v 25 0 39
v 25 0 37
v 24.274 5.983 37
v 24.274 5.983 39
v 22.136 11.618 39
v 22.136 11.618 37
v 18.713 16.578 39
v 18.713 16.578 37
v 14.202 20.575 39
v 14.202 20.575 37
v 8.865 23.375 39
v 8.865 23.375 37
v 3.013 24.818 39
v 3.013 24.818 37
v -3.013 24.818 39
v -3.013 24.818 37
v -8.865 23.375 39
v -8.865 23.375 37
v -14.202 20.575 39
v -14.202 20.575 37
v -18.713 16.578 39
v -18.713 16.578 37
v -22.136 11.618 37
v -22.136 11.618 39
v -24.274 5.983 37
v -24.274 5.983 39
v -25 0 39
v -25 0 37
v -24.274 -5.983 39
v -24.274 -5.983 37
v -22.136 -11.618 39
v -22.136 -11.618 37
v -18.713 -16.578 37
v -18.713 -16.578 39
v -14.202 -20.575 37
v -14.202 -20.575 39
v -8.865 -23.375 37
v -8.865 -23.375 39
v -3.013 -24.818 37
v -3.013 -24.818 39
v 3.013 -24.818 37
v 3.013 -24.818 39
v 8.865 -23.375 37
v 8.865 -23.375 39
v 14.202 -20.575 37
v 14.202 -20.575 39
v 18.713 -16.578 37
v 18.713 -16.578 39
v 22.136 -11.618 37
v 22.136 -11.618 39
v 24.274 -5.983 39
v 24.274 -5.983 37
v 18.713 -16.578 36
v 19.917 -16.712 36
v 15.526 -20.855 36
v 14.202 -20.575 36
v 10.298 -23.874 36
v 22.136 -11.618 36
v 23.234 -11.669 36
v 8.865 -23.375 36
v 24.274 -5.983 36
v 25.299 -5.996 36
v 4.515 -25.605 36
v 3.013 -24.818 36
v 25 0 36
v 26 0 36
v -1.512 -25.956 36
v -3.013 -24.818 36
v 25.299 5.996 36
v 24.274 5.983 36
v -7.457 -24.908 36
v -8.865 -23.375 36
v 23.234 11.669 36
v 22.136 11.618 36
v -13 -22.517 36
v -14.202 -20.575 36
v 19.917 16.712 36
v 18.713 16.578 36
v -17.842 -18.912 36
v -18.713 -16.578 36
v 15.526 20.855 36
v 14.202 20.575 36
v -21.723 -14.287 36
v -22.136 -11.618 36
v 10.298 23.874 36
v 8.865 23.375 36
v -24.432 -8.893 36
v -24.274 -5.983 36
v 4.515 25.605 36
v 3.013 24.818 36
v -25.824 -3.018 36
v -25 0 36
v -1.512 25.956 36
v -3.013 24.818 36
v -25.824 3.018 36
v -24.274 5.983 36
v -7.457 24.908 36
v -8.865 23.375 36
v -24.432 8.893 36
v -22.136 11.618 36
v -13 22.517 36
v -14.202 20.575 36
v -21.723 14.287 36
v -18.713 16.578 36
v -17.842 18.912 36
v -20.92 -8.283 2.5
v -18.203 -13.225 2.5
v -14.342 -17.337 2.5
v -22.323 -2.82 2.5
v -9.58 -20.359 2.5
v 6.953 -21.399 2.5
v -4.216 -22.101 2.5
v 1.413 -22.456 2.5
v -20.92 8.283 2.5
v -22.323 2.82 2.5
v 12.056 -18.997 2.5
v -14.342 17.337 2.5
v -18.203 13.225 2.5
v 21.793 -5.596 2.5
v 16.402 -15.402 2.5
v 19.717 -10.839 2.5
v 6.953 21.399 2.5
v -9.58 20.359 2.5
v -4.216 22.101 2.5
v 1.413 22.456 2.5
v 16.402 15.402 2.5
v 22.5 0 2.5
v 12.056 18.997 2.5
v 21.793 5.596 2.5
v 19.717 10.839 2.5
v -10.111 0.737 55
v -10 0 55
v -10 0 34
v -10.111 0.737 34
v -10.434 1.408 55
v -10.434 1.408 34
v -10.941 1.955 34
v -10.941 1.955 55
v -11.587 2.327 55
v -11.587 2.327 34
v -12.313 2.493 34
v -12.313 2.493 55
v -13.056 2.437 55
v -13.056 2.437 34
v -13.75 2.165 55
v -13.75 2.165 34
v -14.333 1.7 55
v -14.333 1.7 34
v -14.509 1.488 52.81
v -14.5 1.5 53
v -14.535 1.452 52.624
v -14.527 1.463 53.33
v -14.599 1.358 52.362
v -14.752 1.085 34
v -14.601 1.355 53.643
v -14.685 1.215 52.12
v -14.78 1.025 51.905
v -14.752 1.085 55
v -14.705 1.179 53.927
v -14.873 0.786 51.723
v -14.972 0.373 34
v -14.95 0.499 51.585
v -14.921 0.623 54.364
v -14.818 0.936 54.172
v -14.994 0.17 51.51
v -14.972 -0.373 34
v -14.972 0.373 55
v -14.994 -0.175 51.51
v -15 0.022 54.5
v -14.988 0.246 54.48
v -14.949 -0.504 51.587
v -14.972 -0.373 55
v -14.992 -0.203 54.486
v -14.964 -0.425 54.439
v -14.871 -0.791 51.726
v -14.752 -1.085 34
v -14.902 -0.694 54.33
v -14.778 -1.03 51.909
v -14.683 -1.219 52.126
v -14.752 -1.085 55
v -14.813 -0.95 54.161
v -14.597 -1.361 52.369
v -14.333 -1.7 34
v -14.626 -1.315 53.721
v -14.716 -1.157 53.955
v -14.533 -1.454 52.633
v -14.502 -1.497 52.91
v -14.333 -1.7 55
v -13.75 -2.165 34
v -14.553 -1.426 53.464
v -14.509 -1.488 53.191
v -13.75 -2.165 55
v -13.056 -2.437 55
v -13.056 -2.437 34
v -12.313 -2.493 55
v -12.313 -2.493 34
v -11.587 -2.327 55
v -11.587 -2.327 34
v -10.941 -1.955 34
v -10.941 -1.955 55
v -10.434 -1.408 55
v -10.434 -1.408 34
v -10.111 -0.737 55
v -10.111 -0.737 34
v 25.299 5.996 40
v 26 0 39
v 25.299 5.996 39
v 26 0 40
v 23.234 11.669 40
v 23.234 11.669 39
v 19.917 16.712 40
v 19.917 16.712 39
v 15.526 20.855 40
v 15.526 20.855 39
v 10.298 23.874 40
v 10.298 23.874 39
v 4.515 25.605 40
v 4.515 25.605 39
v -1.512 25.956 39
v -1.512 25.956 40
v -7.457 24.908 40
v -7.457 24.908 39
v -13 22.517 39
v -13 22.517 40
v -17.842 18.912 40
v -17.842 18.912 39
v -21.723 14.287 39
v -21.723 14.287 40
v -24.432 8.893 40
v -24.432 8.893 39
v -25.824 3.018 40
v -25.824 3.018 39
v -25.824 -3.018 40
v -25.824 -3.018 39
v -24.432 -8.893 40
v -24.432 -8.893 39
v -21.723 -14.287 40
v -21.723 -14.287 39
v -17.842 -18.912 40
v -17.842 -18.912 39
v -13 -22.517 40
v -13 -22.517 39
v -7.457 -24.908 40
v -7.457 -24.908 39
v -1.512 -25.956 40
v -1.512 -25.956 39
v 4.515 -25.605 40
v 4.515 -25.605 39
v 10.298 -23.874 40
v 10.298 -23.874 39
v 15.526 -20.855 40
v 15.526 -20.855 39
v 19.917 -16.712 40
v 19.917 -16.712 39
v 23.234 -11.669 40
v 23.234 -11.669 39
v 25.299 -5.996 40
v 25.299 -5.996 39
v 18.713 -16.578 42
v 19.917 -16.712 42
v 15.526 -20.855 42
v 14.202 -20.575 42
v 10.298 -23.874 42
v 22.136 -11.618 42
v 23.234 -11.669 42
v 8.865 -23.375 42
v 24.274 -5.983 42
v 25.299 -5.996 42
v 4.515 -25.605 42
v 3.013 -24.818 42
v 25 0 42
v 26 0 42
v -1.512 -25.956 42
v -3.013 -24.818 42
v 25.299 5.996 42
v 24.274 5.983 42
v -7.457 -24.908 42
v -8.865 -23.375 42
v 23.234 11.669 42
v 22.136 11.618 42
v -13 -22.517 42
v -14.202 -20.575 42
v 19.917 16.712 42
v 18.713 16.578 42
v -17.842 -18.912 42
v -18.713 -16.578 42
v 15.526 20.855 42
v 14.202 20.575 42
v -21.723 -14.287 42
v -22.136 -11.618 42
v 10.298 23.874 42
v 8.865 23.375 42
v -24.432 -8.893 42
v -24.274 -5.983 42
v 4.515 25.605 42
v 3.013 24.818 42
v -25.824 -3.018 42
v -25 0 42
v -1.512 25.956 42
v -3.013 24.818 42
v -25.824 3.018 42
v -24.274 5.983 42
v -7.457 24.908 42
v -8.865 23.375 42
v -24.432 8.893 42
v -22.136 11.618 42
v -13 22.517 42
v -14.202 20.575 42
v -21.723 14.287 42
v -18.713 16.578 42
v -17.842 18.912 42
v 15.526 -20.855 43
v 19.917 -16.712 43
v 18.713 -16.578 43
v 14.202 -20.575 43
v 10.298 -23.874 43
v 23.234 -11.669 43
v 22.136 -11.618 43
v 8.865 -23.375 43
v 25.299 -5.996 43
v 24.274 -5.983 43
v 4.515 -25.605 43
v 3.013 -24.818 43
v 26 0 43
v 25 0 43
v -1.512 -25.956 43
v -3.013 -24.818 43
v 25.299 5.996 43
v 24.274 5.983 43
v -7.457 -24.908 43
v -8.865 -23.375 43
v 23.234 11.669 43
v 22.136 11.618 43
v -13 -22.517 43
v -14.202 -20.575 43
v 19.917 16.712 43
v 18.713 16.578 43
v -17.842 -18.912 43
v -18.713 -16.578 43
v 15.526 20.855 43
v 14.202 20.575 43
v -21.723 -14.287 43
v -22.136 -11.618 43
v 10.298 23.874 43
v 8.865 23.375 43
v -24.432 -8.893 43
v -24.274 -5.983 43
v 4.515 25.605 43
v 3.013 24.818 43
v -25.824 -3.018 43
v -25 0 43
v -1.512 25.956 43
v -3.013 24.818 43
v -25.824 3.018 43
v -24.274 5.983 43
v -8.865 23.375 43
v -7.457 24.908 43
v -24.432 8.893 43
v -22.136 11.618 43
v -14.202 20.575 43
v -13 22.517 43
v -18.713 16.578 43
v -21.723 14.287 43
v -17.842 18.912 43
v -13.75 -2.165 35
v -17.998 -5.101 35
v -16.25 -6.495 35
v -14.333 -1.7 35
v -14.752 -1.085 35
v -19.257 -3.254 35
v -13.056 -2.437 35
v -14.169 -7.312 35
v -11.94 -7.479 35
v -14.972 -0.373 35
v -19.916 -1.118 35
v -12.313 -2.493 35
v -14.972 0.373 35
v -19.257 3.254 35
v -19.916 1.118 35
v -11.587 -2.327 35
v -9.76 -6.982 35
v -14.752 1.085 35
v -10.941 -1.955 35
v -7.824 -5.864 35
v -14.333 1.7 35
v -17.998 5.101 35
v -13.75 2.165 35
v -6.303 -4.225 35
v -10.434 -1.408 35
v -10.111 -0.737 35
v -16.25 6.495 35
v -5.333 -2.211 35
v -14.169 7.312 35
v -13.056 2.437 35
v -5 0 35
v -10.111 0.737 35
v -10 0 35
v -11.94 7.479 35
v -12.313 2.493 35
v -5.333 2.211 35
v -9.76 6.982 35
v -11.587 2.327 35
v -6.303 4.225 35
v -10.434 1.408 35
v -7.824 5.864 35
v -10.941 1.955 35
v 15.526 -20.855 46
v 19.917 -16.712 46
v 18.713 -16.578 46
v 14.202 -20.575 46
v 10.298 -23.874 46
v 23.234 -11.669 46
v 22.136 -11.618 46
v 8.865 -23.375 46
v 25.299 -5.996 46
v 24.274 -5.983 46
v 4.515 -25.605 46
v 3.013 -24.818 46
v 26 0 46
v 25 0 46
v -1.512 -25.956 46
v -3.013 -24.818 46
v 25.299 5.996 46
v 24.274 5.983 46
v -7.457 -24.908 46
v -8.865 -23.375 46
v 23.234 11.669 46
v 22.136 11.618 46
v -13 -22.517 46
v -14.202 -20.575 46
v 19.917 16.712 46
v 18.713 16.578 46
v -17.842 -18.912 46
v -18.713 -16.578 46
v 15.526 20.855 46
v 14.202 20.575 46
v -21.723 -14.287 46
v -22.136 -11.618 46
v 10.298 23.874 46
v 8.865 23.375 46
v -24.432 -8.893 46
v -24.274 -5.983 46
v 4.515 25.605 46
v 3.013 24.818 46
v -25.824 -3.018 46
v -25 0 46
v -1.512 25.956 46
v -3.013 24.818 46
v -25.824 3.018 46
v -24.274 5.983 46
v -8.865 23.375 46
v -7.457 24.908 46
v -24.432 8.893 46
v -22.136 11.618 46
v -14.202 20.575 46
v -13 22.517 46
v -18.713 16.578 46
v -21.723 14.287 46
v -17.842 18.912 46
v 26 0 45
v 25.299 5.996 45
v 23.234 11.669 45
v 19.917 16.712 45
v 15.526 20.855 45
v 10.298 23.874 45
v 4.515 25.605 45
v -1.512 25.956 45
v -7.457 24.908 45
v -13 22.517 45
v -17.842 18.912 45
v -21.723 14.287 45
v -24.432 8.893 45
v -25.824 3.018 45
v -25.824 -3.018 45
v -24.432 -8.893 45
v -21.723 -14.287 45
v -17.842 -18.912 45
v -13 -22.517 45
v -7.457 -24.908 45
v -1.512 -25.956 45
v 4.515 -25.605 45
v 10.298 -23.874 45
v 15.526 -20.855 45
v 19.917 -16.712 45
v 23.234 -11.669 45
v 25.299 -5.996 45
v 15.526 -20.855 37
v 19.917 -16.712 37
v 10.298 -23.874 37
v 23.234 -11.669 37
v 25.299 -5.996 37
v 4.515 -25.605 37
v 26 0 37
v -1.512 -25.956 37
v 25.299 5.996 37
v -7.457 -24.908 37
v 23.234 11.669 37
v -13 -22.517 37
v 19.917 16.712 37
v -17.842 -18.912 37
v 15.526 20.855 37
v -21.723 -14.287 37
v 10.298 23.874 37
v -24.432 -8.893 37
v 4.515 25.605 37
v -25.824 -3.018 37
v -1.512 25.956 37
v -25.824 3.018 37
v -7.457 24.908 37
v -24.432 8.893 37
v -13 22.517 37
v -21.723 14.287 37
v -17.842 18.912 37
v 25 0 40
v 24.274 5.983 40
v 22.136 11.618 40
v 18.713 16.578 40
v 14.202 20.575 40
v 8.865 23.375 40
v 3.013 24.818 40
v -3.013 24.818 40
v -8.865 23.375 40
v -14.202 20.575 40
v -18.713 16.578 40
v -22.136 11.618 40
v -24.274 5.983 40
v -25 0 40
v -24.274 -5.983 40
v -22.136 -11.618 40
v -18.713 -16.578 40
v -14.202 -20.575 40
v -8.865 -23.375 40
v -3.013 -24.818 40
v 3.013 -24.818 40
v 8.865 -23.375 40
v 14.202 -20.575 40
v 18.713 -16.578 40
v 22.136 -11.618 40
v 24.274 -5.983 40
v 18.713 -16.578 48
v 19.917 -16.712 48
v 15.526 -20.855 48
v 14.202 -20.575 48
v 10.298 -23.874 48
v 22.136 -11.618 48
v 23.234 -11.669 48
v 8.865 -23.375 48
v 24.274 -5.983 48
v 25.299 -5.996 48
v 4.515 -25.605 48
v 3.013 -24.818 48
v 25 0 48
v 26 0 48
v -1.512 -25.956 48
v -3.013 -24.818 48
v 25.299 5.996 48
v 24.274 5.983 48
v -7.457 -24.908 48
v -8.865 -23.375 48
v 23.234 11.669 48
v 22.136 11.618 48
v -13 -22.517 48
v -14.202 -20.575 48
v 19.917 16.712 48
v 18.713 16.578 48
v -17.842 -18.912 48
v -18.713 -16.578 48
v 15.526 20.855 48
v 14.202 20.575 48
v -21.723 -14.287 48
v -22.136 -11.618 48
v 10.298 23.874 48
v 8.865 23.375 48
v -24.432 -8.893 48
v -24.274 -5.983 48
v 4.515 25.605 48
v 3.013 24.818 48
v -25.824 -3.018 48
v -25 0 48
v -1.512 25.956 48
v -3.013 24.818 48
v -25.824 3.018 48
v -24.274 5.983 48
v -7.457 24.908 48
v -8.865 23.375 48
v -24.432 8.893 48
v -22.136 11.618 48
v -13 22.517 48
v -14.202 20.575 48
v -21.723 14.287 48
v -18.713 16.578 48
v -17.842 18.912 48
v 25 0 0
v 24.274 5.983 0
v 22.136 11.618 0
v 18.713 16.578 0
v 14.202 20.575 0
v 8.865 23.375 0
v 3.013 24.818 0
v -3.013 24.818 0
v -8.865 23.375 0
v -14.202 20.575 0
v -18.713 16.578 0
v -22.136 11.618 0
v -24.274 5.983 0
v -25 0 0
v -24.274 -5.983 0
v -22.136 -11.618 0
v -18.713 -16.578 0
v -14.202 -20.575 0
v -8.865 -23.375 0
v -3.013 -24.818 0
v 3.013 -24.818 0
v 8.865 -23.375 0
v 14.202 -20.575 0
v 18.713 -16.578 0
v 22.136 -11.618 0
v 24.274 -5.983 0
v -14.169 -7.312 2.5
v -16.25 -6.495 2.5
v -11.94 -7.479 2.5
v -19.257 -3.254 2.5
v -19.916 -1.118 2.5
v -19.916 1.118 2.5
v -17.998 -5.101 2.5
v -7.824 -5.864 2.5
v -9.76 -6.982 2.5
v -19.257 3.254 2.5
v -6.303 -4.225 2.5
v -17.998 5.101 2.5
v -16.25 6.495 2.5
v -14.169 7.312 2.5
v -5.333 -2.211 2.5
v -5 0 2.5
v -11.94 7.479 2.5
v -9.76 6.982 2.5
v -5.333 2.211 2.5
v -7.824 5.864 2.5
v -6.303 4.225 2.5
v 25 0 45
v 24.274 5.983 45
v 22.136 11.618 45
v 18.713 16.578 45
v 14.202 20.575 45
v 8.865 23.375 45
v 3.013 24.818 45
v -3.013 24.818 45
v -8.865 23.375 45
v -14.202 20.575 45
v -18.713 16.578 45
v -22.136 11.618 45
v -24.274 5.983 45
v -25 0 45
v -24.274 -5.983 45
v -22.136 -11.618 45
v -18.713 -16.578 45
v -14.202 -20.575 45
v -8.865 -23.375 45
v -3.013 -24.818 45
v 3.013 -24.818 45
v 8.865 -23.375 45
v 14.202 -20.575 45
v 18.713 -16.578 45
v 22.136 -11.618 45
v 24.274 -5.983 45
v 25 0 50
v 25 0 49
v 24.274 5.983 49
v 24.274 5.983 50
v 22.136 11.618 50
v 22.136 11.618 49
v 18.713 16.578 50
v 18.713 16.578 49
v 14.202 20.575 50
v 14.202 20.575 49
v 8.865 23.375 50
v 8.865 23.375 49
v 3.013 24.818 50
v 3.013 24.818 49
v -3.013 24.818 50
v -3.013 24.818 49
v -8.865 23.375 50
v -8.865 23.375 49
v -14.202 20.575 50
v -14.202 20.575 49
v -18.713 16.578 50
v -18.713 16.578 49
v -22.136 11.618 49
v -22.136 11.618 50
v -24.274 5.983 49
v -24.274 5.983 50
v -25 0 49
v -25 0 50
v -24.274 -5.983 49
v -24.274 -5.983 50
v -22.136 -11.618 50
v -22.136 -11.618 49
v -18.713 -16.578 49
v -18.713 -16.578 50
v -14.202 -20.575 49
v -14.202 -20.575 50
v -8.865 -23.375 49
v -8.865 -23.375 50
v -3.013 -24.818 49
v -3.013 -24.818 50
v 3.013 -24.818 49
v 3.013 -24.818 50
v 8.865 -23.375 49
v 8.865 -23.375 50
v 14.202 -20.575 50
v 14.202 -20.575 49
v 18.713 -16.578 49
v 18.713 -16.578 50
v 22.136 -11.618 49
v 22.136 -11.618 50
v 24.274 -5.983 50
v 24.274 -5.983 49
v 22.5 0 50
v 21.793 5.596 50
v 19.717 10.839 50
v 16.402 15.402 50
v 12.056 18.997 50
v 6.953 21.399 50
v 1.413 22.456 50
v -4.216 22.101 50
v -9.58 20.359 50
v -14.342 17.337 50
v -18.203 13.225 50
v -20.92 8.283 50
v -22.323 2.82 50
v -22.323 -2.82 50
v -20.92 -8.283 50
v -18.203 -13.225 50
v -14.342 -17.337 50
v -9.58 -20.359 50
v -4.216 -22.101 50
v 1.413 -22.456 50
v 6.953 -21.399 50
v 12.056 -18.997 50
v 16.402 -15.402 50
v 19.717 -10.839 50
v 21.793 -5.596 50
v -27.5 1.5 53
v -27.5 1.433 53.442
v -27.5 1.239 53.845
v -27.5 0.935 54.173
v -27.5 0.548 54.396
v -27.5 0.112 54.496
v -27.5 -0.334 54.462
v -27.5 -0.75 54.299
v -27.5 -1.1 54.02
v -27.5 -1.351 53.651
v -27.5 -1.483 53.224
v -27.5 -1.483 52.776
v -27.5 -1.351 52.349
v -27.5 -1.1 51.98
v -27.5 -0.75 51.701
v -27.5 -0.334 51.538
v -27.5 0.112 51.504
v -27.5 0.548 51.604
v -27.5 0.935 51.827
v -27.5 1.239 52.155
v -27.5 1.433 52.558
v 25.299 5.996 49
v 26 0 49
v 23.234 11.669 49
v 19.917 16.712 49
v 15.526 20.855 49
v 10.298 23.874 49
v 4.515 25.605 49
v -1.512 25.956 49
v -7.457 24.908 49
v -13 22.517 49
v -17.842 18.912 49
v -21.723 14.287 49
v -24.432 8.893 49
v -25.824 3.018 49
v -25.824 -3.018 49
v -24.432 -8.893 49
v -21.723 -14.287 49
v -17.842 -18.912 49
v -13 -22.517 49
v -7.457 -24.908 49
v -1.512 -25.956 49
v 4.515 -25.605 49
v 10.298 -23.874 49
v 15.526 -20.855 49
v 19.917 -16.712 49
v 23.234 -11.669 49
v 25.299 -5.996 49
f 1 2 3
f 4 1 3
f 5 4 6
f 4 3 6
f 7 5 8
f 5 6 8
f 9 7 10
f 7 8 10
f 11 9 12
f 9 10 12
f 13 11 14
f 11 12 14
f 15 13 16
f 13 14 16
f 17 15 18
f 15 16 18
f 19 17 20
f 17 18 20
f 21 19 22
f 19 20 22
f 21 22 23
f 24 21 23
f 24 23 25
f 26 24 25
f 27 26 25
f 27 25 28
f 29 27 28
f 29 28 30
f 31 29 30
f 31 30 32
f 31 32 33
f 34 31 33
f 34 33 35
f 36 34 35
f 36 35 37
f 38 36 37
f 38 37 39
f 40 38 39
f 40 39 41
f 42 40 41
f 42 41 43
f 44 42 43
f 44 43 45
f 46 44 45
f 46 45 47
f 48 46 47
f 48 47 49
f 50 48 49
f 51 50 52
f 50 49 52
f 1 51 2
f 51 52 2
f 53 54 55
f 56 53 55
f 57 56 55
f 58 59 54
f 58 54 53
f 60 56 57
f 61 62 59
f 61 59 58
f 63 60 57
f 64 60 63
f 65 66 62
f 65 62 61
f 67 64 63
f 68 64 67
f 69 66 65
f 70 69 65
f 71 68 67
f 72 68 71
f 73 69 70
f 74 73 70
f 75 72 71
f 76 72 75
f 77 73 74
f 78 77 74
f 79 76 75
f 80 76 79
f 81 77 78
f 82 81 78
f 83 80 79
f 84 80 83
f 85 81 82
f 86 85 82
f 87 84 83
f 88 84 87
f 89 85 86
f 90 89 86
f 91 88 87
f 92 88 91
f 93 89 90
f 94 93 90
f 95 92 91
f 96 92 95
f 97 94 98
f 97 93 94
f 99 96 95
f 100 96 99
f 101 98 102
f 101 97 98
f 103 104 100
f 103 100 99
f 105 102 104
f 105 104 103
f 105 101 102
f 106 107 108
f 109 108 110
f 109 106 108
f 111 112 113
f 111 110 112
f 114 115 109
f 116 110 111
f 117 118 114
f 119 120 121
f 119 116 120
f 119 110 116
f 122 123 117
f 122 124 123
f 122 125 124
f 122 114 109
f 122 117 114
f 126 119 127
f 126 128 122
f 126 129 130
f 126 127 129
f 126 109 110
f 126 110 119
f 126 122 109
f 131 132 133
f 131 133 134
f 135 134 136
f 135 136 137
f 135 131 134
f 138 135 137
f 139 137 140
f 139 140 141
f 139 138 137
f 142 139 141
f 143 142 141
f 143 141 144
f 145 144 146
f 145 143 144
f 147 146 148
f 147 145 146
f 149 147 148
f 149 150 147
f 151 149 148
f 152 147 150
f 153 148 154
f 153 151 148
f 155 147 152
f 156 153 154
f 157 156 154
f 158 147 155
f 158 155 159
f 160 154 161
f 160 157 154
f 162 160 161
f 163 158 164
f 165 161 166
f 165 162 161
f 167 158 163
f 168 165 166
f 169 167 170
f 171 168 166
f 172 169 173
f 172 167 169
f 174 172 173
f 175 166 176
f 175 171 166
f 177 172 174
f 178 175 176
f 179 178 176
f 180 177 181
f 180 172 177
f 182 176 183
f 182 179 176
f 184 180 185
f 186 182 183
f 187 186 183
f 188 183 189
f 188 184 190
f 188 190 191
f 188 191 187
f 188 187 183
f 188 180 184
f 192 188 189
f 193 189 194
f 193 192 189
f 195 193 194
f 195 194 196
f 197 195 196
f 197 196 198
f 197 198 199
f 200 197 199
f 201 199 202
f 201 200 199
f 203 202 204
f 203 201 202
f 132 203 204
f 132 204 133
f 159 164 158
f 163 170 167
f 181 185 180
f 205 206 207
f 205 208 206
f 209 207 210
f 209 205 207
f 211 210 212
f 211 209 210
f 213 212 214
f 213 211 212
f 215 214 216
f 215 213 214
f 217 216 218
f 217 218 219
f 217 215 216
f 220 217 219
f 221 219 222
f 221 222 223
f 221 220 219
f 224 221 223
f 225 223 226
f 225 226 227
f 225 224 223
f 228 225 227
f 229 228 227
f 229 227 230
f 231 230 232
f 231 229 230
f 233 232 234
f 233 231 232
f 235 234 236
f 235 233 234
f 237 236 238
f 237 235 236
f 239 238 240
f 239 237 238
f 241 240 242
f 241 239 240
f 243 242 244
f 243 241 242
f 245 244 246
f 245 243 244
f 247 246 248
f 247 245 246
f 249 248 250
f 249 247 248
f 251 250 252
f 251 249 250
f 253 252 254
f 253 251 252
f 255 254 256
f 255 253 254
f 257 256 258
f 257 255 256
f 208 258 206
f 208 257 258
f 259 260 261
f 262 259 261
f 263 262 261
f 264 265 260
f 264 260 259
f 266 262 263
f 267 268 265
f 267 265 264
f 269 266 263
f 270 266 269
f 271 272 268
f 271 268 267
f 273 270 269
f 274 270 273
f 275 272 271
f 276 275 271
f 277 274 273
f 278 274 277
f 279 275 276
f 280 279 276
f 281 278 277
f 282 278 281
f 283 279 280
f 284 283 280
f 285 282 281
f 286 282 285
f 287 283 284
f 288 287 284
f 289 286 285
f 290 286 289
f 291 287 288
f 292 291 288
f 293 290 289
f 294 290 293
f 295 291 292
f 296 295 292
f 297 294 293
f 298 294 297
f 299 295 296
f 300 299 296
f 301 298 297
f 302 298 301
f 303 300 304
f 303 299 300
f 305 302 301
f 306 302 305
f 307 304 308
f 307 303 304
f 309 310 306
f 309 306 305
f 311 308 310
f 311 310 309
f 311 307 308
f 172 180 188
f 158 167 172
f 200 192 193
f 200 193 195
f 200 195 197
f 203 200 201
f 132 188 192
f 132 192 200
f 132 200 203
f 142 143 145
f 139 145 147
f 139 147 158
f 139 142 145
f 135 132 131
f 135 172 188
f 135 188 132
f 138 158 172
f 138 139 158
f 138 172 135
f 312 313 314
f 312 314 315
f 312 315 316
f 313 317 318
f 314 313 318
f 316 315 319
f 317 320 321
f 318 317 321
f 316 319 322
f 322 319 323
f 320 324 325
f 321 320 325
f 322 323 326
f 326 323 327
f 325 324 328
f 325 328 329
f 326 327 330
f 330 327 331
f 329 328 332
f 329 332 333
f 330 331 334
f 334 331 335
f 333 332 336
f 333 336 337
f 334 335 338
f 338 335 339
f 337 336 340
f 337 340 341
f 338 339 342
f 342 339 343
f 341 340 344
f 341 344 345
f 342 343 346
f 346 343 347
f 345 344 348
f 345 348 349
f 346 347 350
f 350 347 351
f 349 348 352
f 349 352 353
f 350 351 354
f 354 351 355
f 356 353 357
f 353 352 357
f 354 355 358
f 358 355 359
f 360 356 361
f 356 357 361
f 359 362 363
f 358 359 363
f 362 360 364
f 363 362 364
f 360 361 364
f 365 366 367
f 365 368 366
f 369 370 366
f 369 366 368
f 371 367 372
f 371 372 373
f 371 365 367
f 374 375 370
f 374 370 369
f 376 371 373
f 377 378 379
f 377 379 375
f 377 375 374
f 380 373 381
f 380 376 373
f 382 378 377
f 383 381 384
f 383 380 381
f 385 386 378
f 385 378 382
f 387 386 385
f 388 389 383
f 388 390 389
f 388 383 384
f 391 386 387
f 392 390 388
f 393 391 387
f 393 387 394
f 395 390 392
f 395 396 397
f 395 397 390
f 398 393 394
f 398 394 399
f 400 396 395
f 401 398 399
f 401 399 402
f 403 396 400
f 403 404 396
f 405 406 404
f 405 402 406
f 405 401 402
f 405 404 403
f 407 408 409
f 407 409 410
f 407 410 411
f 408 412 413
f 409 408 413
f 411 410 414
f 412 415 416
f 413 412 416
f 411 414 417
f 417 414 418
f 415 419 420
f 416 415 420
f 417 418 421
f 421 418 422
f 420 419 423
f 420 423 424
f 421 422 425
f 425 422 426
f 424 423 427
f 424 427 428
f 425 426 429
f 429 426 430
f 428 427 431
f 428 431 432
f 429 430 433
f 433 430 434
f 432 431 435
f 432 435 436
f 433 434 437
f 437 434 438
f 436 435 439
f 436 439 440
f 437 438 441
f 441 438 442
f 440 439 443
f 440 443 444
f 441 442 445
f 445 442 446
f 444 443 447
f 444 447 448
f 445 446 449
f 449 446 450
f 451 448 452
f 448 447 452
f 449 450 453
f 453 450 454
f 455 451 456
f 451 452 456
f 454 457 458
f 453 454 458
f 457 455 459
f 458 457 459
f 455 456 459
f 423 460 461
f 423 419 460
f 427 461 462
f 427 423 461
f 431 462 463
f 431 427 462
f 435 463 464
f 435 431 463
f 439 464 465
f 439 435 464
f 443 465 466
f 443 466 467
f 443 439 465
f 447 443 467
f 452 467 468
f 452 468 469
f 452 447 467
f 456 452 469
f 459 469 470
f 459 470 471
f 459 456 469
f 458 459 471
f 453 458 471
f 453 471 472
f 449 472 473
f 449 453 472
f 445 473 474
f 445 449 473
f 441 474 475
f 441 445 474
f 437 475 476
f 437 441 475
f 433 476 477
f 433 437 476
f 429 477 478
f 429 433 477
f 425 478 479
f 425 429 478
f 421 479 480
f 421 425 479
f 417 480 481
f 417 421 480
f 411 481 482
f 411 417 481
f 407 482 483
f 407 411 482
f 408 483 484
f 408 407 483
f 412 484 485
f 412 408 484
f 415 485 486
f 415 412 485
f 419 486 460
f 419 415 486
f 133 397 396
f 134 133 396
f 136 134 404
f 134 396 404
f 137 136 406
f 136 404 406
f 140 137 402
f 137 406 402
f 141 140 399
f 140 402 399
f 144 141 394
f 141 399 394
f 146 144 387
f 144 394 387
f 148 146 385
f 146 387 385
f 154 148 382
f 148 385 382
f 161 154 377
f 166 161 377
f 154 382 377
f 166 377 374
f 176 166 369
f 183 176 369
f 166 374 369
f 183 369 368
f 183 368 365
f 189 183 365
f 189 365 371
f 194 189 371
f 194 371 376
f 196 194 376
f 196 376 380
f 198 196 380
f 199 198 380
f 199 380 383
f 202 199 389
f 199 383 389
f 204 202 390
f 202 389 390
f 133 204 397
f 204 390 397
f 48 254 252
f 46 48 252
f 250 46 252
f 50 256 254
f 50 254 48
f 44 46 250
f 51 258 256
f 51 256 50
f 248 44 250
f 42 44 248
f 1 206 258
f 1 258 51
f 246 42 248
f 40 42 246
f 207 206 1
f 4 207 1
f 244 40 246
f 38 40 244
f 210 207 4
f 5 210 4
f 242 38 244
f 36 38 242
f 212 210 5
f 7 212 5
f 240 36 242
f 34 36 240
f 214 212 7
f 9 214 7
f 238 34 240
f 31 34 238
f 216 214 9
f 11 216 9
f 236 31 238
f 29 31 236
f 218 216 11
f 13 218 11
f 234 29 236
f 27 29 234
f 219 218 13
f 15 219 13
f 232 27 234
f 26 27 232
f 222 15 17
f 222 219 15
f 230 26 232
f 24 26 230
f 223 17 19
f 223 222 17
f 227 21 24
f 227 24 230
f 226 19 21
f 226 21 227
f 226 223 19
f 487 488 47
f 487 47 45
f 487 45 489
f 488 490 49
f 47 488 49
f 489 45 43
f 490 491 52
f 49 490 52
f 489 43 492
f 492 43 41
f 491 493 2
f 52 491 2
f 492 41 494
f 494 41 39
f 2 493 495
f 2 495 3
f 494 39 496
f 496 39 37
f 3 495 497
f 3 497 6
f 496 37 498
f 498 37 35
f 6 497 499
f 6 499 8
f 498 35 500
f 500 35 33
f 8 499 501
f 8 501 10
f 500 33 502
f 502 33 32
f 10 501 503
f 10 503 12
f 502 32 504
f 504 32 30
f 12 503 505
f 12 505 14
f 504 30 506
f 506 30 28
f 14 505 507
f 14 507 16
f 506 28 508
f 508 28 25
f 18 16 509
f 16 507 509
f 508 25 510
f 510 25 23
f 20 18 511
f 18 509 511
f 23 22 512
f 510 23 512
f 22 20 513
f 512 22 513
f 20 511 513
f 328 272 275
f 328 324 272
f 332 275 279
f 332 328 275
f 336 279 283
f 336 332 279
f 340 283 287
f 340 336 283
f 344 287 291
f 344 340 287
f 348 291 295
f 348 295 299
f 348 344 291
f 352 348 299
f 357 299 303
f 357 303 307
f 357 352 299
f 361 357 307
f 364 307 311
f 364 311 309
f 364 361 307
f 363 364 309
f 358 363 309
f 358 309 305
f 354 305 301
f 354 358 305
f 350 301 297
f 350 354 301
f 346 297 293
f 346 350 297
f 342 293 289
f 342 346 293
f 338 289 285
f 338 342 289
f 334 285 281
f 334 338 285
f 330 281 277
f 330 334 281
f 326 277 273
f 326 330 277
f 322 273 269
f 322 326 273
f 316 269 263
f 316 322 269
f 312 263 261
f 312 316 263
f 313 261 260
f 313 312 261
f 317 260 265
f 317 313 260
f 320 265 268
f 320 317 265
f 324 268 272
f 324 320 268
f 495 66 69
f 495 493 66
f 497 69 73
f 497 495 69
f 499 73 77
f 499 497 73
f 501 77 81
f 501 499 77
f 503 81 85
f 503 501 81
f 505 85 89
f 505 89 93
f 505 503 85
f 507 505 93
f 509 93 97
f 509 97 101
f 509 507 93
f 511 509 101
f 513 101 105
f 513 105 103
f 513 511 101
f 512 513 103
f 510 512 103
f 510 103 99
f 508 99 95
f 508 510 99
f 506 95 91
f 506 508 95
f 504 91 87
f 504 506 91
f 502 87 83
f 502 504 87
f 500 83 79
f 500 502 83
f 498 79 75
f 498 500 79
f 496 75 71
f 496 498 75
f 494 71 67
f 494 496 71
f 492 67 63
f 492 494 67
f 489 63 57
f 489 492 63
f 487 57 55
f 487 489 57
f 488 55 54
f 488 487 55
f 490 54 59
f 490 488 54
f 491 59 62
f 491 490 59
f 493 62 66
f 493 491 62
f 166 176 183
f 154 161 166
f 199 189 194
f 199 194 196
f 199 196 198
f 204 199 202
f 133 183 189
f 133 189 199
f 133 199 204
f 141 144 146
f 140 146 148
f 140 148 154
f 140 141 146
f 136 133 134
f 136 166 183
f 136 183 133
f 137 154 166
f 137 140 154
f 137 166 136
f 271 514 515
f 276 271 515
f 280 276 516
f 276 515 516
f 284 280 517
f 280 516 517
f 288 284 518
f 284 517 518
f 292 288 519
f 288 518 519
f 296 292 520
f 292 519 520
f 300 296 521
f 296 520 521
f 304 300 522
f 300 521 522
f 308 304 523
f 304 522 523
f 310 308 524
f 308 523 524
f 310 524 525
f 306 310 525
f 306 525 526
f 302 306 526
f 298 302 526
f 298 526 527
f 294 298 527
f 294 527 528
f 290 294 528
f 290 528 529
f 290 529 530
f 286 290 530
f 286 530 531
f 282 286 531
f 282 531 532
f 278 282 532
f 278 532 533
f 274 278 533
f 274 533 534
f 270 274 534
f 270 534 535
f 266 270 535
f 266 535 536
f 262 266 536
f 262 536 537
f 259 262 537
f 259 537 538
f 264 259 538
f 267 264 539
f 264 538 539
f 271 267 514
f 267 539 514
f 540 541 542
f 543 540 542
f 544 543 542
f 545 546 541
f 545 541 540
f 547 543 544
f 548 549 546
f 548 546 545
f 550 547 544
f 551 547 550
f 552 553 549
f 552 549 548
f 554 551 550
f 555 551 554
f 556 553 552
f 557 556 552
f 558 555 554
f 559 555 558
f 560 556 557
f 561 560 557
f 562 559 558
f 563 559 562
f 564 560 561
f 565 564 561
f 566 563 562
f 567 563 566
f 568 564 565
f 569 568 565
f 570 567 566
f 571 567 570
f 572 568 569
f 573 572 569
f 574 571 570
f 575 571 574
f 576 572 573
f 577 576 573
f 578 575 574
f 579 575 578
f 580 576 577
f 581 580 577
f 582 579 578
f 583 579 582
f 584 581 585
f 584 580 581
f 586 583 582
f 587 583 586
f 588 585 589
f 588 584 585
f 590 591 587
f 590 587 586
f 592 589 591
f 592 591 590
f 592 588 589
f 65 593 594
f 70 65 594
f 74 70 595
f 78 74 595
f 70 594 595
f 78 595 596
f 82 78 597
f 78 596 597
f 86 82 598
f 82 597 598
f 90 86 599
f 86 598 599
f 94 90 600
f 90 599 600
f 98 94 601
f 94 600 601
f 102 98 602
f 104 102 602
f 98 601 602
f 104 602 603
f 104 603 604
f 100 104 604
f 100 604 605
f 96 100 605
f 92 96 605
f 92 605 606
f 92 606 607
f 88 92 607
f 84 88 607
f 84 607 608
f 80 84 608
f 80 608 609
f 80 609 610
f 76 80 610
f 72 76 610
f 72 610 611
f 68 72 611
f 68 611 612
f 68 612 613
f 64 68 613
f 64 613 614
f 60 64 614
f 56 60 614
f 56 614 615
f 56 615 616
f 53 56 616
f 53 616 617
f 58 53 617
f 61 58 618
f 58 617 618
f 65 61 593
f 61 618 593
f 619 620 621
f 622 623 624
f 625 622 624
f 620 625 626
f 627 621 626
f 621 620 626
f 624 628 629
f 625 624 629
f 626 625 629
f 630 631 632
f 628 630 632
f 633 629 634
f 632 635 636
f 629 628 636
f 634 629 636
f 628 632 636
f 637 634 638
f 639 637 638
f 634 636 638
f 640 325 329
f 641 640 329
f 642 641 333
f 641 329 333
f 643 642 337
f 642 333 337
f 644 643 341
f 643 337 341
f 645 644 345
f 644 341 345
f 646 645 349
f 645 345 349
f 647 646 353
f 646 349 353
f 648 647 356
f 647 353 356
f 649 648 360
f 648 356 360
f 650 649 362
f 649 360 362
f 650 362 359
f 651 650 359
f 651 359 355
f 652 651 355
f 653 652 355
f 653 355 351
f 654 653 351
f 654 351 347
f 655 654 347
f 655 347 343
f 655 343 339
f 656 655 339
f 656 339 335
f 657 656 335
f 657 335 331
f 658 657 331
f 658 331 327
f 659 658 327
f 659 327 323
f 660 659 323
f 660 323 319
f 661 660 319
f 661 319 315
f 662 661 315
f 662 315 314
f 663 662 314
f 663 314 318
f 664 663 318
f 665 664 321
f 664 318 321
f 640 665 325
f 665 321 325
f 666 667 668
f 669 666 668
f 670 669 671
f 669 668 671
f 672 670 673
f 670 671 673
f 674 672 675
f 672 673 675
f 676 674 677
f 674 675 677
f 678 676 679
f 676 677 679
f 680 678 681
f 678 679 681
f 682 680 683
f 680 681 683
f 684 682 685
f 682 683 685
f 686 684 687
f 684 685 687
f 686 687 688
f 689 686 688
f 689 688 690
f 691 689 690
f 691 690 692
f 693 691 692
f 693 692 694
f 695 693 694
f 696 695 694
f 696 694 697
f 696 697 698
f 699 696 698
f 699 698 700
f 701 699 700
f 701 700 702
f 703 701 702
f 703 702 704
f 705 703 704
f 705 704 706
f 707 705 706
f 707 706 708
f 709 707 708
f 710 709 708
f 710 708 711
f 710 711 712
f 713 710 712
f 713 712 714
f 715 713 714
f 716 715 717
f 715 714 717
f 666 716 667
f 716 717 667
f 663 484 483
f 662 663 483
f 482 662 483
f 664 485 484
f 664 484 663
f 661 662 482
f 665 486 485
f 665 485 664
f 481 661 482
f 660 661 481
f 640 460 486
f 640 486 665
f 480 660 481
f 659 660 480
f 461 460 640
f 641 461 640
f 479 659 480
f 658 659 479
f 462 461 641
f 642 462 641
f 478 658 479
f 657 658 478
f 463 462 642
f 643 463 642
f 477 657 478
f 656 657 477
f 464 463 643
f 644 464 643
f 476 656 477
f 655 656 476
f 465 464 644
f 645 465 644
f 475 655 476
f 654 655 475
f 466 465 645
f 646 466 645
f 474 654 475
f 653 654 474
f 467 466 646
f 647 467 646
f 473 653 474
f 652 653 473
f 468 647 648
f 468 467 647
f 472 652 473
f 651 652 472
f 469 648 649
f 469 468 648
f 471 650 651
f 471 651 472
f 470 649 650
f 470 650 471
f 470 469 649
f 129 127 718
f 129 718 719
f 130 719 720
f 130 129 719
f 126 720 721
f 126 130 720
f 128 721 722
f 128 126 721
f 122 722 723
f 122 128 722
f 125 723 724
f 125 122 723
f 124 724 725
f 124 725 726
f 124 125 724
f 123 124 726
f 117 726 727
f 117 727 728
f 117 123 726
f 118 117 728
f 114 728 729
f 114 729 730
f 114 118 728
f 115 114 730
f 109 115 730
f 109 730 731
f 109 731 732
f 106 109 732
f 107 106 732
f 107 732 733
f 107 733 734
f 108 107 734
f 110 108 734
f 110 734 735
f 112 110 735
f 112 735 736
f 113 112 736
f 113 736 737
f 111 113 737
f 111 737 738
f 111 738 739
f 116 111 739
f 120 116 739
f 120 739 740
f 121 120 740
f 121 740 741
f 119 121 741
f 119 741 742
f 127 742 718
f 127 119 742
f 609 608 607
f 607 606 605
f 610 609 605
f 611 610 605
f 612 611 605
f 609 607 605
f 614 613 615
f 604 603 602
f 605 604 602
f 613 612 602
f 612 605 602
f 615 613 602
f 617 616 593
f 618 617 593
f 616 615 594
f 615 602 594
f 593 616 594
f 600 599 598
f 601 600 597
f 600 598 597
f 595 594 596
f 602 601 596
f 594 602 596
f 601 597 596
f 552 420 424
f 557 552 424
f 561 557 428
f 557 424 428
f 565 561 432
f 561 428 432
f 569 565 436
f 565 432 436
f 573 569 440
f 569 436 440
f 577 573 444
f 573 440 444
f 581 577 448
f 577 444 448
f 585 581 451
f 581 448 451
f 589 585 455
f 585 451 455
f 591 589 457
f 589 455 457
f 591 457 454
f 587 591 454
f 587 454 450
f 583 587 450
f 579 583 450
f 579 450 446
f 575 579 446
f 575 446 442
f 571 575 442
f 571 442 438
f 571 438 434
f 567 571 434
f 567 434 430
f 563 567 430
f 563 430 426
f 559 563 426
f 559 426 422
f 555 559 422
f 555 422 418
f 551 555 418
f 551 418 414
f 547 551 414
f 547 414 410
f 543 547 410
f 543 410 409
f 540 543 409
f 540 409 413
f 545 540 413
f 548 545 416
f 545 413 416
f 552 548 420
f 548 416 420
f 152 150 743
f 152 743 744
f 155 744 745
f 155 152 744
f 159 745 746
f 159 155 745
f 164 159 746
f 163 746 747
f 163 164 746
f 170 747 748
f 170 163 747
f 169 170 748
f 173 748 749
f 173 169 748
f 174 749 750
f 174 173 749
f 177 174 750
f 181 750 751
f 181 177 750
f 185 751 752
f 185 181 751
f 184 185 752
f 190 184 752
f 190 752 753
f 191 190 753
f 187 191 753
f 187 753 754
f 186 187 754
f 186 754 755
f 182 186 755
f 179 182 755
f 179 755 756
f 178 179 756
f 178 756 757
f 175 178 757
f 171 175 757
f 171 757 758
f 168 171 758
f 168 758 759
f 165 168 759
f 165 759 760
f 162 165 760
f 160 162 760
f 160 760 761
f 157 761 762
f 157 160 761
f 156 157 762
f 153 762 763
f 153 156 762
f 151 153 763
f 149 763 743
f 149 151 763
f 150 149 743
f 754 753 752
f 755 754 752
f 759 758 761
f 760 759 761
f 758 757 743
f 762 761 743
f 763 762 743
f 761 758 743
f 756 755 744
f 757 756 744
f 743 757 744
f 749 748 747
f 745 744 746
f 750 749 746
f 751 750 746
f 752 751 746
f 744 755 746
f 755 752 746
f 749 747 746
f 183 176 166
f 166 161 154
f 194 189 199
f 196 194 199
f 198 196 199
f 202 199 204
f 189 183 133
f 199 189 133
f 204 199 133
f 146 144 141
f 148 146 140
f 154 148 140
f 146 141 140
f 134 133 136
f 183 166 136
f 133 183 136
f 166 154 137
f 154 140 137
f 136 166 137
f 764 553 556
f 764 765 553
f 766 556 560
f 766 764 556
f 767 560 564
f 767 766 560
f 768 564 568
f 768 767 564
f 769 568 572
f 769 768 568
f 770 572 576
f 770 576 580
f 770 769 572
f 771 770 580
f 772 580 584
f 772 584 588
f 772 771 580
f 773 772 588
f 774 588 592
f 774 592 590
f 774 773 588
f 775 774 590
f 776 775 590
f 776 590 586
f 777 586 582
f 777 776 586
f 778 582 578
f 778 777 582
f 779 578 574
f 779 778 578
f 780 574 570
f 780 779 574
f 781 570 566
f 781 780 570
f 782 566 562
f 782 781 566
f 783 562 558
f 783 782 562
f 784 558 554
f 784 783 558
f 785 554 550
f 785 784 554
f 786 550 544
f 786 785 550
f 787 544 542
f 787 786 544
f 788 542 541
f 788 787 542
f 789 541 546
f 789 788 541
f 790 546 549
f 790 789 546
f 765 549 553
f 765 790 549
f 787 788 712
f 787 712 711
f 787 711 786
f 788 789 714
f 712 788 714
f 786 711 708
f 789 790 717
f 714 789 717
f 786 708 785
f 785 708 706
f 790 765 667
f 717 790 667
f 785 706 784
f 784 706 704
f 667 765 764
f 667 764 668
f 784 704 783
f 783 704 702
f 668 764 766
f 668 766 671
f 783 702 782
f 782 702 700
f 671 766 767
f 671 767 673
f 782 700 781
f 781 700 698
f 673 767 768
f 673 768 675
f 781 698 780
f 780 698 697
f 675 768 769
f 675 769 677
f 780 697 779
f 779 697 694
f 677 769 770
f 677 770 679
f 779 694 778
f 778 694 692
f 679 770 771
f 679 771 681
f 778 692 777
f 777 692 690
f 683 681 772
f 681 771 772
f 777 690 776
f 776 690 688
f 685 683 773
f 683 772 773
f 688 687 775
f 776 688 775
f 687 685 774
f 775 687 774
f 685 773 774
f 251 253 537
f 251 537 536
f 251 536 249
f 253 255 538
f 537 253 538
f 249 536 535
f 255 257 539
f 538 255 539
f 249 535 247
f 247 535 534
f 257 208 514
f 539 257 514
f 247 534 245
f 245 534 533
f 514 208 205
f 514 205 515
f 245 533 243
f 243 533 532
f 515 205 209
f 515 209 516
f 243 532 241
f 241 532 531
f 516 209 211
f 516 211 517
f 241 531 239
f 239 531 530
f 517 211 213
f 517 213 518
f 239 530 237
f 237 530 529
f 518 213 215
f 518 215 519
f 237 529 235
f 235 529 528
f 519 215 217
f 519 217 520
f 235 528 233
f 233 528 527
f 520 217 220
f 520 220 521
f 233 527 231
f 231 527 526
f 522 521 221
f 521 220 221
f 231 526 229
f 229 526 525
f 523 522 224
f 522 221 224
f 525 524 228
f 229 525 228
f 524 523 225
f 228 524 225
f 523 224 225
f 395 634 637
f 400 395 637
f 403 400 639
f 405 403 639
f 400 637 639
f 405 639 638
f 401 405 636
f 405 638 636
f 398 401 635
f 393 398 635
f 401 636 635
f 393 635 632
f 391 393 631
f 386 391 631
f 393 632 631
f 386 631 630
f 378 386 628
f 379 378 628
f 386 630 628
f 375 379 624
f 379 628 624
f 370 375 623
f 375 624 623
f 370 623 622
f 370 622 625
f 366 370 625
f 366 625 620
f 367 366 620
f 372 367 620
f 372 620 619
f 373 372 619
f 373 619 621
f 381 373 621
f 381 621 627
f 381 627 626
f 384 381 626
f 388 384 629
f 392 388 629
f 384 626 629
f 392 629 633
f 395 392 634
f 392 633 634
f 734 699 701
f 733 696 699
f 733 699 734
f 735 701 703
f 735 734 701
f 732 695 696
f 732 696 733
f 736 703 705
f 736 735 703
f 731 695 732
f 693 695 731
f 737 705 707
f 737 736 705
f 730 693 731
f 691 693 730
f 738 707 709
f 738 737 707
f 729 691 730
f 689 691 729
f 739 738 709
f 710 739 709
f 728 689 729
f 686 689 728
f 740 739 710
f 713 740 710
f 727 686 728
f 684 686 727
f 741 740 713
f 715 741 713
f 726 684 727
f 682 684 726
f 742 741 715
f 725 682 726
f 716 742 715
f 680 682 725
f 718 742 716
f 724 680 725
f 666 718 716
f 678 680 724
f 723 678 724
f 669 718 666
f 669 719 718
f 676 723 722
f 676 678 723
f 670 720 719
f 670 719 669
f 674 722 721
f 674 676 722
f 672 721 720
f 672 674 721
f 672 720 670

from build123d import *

# Parameters (mm, degrees)
F0_R          = 25
F1_DEPTH      = 50
F2_T          = -2.5
F3_W          = 1
F3_H          = 1
F6_START      = 2.5
F5_R          = 7.5
F6_DEPTH      = 32.5
F7_R          = 2.5
F8_DEPTH      = 20
F8_DEPTH_BACK = 1
F11_R         = 1.5
F12_DEPTH     = 15


with BuildPart() as f1:
    # F0 (on Top) → F1 (new body)
    with BuildSketch(Plane.XY):
        Circle(F0_R)
    extrude(amount=F1_DEPTH)

    # F2
    f2_openings = [f1.faces().sort_by_distance(p)[0] for p in [
        (0, 0, 50),
    ]]
    offset(amount=F2_T, openings=f2_openings)

    # F3 (on Front) → F4 (revolve)
    with BuildSketch(Plane.XZ):
        with Locations((25.5, 48.5)):
            Rectangle(F3_W, F3_H)
        with Locations((25.5, 36.5)):
            Rectangle(F3_W, F3_H)
        with Locations((25.5, 39.5)):
            Rectangle(F3_W, F3_H)
        with Locations((25.5, 42.5)):
            Rectangle(F3_W, F3_H)
        with Locations((25.5, 45.5)):
            Rectangle(F3_W, F3_H)
    revolve(axis=Axis((0, 0, 25), (0, 0, 1)))


with BuildPart() as f6:
    # F5 (on Top) → F6 (new body)
    with BuildSketch(Plane.XY.offset(F6_START)):
        with Locations((-12.5, 0)):
            Circle(F5_R)
    extrude(amount=F6_DEPTH)


with BuildPart() as f8:
    # F7 (on face) → F8 (new body, two sides)
    with BuildSketch(Plane.XY.offset(35)) as f8_sk:
        with Locations((-12.5, 0)):
            Circle(F7_R)
    extrude(amount=F8_DEPTH)
    extrude(f8_sk.sketch, amount=-F8_DEPTH_BACK)


with BuildPart() as f6_1:
    add(f6.part)

    # F9: cut F8
    add(f8.part, mode=Mode.SUBTRACT)


with BuildPart() as f8_1:
    add(f8.part)

    # F11 (on offset) → F12 (join)
    with BuildSketch(Plane.YZ.offset(-12.5)):
        with Locations((0, 53)):
            Circle(F11_R)
    extrude(amount=-F12_DEPTH)


solid = Compound([f1.part, f6_1.part, f8_1.part])
